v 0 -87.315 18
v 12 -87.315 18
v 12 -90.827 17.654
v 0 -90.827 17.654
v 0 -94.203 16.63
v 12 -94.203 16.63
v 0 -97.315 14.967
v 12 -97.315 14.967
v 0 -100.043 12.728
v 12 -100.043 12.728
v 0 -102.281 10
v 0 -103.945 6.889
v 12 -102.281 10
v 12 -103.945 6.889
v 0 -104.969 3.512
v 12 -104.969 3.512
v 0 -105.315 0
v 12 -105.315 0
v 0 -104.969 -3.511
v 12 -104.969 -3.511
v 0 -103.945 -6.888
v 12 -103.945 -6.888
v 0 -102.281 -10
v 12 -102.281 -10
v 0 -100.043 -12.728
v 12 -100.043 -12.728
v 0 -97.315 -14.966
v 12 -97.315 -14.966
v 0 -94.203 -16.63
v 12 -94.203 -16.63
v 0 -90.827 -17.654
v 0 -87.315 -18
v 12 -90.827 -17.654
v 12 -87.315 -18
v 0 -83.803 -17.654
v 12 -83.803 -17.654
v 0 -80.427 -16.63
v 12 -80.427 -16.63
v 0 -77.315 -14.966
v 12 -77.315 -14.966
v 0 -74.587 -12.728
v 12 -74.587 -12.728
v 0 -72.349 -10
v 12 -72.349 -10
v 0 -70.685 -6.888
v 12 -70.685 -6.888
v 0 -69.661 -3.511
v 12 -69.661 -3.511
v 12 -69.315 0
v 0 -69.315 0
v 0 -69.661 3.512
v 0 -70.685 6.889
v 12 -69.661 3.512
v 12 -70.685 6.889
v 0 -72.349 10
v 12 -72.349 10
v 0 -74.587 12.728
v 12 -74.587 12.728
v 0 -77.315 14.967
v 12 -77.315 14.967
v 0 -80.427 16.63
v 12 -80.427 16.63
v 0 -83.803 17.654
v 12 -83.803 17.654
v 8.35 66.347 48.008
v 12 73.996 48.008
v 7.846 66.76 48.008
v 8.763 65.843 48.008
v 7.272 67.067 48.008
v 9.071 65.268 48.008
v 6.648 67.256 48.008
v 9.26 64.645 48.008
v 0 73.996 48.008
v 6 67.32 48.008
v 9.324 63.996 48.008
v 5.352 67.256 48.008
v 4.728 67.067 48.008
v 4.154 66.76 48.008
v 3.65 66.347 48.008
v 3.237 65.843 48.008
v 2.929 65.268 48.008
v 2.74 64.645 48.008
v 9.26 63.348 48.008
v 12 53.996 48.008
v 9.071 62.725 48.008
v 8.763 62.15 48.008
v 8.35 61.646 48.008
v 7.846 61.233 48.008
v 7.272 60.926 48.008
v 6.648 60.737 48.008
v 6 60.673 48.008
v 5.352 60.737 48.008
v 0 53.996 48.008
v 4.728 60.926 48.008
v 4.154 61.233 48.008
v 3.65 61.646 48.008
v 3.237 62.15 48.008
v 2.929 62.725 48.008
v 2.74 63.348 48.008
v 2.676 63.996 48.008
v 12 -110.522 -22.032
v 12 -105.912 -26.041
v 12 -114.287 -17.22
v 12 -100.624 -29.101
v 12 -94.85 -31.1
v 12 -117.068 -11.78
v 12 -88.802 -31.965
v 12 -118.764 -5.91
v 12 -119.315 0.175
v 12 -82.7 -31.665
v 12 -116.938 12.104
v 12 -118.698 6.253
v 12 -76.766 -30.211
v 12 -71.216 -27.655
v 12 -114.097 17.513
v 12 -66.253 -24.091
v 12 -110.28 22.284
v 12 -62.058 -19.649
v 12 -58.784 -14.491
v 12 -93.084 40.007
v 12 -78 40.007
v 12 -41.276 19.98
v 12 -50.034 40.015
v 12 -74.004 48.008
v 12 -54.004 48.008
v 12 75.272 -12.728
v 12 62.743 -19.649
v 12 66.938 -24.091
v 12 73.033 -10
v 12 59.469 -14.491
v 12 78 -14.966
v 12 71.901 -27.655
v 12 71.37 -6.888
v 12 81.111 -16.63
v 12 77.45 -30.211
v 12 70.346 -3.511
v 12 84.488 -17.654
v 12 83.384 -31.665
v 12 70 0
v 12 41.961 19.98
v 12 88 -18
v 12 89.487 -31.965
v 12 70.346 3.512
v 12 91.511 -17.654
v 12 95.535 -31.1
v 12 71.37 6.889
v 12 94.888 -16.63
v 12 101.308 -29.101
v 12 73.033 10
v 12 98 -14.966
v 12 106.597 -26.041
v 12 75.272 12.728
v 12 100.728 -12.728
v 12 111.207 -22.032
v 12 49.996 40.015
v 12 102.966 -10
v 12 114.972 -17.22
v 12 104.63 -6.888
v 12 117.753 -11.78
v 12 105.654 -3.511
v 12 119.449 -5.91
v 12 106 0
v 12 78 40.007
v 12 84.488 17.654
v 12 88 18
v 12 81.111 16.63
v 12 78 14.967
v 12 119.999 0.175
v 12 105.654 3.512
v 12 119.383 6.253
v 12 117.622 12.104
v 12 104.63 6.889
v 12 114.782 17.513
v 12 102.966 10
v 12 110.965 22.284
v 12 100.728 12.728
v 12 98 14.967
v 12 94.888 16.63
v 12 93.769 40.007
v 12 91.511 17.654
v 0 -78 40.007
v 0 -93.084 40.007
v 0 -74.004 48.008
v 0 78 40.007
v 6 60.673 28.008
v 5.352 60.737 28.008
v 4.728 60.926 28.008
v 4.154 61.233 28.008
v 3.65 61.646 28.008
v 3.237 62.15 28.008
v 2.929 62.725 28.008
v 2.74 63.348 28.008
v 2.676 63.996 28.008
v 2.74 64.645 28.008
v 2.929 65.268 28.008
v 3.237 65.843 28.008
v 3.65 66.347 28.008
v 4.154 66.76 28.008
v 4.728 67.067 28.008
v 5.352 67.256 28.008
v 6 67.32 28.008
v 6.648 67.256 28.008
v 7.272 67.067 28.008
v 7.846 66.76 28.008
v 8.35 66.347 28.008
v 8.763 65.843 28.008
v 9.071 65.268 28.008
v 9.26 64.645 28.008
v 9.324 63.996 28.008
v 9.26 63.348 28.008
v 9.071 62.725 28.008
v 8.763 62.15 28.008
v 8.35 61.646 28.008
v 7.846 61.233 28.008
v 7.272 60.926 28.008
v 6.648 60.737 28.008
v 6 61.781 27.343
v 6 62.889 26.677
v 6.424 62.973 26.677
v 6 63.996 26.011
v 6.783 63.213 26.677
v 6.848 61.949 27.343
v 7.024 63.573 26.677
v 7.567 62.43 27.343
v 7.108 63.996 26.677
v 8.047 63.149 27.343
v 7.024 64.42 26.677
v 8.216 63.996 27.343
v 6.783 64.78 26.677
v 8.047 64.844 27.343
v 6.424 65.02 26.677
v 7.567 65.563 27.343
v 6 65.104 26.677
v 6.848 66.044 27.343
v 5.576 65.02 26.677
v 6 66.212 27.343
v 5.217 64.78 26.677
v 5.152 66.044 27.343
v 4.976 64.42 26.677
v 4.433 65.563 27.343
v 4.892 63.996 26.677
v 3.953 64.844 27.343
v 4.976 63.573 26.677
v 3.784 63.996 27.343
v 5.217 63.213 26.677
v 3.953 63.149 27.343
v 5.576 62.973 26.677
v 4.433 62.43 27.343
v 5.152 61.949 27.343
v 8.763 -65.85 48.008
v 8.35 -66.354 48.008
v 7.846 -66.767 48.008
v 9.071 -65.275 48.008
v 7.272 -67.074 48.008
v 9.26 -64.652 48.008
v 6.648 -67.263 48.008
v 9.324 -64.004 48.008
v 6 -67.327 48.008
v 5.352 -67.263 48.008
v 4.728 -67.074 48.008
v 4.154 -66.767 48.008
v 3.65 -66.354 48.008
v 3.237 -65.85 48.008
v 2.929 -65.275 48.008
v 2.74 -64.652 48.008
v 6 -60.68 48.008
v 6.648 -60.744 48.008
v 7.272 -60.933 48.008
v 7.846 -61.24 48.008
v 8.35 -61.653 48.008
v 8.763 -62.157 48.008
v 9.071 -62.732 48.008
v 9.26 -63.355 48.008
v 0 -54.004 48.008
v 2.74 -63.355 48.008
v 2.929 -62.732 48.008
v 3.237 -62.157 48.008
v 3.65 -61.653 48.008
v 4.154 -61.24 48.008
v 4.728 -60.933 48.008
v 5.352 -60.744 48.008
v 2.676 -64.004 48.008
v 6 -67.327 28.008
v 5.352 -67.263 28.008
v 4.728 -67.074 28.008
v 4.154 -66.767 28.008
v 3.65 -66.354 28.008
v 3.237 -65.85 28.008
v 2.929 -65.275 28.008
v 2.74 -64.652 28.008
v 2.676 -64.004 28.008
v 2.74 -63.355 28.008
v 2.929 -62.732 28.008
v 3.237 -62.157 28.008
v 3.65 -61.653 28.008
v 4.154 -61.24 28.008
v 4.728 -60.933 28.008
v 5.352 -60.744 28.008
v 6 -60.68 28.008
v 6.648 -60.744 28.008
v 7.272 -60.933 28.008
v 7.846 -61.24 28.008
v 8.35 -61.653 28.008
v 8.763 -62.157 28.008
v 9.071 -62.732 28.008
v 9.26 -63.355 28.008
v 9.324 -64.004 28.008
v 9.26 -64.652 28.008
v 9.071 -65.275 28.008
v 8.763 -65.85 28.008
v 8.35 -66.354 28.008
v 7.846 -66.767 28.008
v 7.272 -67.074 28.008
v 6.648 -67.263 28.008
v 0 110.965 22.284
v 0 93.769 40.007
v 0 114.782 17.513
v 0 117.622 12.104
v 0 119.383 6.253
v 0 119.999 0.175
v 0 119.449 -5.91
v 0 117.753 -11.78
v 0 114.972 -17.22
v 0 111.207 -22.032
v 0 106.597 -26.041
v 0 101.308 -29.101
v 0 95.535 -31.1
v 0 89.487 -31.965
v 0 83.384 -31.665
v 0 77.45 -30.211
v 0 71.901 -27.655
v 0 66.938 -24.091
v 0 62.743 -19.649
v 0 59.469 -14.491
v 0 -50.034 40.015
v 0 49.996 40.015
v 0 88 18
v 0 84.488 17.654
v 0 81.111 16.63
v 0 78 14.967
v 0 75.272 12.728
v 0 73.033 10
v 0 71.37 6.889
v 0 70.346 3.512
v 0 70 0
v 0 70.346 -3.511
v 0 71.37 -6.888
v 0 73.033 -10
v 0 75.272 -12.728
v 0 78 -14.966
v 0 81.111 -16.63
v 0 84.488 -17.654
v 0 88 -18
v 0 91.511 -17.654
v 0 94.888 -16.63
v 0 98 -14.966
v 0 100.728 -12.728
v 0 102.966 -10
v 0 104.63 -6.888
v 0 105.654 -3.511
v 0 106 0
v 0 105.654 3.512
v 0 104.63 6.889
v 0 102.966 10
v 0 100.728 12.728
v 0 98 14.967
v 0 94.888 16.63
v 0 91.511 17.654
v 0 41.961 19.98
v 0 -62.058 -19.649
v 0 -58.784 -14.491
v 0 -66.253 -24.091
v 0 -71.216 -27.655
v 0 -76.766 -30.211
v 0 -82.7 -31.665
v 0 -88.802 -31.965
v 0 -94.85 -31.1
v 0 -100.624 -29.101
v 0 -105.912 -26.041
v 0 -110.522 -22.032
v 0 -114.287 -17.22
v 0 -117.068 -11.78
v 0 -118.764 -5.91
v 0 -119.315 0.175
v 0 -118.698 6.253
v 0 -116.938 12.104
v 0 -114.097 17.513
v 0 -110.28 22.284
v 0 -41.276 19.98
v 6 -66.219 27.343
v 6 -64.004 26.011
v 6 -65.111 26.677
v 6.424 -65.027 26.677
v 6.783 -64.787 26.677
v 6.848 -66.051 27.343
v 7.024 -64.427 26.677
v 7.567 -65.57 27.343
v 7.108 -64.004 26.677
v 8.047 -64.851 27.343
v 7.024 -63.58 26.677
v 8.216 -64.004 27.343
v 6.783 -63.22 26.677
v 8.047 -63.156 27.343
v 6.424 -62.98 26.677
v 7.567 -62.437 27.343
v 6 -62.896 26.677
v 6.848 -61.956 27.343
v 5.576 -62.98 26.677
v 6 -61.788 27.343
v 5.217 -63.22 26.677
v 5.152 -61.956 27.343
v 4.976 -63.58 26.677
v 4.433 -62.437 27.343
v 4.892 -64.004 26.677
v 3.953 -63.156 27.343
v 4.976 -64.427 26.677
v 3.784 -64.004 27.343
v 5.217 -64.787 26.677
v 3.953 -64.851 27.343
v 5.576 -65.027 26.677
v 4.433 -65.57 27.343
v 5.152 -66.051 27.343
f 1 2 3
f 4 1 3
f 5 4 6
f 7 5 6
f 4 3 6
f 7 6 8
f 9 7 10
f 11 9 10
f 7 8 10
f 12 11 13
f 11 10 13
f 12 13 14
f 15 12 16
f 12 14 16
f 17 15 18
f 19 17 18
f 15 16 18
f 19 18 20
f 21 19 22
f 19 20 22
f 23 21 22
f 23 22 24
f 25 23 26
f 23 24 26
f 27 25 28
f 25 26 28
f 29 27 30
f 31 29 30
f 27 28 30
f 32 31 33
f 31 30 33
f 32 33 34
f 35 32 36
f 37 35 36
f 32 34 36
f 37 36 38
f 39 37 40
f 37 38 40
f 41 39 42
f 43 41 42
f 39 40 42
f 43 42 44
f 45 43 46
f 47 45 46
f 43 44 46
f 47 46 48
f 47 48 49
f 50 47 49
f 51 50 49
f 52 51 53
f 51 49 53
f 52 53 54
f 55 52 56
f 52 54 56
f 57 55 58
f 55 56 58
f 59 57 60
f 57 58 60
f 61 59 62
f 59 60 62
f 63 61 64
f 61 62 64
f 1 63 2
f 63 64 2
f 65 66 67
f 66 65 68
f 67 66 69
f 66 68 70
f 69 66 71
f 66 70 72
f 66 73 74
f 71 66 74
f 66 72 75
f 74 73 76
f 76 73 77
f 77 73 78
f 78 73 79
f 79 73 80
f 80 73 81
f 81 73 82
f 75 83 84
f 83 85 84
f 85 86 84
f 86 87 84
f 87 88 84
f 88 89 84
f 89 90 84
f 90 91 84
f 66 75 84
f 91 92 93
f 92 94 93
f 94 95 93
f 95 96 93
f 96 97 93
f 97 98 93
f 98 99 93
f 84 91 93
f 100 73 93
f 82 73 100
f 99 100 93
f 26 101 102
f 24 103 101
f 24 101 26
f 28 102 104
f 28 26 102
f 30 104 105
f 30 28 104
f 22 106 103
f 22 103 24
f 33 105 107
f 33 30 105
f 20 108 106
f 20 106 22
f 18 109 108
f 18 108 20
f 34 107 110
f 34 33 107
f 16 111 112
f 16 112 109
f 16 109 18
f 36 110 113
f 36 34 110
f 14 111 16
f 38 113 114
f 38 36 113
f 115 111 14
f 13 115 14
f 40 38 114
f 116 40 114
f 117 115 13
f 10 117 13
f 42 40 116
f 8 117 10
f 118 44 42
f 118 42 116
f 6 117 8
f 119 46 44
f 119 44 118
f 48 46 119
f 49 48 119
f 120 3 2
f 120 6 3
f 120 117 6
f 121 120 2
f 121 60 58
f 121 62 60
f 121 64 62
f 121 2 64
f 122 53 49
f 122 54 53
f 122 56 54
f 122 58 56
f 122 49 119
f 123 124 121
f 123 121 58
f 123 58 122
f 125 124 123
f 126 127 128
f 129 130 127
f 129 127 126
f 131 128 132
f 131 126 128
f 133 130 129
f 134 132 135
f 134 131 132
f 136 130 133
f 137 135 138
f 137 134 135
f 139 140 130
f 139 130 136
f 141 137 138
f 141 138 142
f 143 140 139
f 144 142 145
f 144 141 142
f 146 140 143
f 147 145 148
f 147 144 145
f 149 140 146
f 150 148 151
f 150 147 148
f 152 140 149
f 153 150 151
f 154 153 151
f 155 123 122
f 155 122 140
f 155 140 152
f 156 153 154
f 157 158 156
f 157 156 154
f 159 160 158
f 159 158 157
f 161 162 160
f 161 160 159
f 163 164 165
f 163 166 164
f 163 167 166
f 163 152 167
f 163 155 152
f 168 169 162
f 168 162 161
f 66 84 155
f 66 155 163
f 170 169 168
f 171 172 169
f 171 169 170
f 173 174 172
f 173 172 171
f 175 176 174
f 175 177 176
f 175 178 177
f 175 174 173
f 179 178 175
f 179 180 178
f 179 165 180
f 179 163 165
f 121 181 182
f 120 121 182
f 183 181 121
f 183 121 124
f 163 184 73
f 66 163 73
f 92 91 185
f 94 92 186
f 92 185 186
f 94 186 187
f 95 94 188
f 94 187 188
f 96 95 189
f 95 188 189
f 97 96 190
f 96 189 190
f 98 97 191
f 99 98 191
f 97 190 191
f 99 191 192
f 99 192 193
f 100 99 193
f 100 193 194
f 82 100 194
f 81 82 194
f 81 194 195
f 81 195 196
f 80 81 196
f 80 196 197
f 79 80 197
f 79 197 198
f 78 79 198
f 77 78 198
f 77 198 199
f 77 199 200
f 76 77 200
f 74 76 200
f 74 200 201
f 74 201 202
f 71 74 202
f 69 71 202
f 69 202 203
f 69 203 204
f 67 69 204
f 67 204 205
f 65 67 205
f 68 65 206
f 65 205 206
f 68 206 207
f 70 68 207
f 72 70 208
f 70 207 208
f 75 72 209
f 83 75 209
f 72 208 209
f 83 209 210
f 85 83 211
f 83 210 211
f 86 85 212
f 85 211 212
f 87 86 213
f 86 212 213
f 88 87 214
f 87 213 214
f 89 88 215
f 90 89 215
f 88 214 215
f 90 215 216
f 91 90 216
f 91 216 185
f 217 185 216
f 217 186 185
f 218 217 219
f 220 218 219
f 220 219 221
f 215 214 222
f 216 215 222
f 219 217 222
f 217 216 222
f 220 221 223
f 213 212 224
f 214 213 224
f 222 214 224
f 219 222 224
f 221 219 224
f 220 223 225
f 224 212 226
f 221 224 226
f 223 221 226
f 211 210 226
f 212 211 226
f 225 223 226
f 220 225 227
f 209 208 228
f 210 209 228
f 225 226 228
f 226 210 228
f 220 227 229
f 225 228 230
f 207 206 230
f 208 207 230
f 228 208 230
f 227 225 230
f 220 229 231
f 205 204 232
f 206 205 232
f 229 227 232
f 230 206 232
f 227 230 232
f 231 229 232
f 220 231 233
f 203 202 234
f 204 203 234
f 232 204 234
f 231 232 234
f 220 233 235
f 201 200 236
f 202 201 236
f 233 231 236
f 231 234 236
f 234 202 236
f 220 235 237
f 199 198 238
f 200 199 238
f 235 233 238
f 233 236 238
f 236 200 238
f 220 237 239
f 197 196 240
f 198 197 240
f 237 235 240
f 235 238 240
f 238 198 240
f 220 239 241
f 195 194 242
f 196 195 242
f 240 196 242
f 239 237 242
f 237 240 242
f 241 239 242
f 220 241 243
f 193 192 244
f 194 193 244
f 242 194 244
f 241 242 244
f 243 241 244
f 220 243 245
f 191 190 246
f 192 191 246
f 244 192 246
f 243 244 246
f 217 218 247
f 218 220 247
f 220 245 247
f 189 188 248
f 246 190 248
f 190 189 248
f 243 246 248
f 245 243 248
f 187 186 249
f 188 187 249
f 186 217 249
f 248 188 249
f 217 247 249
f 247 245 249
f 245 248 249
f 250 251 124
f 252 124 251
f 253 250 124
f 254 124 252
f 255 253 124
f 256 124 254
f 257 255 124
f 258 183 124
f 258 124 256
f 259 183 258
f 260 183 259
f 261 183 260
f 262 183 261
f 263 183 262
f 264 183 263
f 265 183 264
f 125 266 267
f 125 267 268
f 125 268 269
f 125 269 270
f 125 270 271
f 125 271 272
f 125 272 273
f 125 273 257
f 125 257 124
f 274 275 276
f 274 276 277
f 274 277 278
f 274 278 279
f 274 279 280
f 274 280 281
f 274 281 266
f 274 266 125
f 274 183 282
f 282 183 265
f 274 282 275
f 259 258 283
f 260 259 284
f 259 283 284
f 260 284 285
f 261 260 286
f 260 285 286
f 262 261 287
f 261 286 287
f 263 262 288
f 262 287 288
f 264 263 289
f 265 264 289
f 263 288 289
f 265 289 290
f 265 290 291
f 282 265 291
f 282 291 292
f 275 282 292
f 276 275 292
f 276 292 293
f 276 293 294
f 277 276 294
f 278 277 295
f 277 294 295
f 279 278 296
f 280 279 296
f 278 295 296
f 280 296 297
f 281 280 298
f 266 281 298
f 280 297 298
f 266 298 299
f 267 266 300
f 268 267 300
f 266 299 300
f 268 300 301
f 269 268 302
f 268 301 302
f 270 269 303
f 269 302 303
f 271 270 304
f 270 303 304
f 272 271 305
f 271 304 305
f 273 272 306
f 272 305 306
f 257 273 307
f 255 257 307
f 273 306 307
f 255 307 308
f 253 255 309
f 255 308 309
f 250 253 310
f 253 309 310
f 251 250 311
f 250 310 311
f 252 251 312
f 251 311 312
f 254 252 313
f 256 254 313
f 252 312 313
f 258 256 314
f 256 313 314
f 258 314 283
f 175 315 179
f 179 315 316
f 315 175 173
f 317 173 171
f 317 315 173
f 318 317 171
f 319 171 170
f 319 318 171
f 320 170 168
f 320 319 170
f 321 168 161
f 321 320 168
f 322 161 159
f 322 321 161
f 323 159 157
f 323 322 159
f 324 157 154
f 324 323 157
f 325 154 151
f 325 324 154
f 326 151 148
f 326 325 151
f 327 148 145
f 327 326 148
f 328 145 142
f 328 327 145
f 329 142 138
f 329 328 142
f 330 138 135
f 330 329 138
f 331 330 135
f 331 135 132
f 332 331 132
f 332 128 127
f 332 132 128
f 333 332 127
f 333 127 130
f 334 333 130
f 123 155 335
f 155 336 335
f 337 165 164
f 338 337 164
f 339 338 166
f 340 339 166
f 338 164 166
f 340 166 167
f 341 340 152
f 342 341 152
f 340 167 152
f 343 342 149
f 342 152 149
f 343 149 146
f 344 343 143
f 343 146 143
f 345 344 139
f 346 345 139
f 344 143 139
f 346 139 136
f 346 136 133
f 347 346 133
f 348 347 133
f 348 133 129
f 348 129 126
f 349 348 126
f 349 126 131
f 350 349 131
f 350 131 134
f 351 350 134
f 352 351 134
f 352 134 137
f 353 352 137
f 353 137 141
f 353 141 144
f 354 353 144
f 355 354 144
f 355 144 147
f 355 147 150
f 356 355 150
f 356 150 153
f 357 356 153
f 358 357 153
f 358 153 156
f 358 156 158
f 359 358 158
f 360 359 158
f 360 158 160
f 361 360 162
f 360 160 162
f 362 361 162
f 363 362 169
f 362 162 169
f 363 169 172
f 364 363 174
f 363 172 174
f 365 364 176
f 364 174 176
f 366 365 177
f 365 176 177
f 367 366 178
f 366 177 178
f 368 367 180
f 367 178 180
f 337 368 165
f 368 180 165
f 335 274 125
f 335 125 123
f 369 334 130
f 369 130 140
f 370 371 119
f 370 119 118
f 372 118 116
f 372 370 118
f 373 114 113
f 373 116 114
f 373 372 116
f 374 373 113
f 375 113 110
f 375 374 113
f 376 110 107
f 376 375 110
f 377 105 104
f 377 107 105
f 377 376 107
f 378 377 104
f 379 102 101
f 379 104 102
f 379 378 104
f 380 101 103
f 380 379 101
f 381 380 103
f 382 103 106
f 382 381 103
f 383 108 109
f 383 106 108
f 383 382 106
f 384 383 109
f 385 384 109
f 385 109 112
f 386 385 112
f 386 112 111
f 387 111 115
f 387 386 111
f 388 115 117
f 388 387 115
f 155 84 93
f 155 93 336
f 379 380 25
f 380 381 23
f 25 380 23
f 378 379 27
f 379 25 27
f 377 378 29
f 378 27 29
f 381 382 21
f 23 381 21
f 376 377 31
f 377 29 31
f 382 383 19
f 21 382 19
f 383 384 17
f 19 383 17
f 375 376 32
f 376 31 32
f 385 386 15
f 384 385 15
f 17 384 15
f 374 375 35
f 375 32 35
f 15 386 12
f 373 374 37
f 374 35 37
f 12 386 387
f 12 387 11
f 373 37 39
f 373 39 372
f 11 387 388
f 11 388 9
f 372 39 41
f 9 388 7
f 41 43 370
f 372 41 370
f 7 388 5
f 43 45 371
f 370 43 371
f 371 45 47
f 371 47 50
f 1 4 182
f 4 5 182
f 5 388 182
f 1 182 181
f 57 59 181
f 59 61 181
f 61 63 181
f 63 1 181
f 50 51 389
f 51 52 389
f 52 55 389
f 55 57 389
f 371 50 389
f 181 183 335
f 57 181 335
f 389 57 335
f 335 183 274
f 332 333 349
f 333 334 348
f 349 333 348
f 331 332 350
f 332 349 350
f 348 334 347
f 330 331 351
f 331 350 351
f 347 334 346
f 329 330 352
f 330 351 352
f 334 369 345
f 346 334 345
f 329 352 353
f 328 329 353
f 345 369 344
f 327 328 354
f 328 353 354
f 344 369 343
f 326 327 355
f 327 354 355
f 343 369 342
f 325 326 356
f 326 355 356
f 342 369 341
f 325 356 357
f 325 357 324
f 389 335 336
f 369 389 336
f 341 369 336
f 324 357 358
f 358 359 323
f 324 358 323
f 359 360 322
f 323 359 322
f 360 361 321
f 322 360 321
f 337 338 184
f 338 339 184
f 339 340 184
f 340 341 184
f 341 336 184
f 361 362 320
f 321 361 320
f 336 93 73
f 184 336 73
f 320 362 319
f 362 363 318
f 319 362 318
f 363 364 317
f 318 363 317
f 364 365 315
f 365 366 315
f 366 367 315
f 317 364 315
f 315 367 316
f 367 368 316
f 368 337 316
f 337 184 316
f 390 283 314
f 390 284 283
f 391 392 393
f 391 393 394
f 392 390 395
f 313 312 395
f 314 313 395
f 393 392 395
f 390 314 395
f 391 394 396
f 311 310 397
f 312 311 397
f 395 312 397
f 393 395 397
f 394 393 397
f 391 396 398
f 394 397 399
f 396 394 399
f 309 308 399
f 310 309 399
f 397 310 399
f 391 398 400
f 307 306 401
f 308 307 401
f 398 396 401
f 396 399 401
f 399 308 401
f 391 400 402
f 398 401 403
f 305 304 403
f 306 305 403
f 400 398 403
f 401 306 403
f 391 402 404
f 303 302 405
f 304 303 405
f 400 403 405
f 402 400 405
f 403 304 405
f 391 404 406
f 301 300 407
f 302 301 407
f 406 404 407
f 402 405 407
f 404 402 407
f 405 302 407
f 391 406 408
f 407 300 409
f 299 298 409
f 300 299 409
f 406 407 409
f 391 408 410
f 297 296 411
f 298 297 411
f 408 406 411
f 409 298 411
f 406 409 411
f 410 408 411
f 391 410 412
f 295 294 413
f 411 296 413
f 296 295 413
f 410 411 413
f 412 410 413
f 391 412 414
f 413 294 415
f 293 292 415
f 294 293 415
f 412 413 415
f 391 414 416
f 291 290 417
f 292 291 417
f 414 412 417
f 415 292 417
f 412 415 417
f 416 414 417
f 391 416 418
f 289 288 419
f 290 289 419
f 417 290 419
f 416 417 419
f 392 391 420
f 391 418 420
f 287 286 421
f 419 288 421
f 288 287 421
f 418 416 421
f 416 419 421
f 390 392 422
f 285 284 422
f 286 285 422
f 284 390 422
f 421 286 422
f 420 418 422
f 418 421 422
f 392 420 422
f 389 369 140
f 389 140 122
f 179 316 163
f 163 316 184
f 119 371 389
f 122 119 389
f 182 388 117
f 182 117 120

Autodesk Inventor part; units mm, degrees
ref_plane "YZ Plane" through (0, 0, 0) normal (1, 0, 0) x (0, 1, 0)
ref_plane "XZ Plane" through (0, 0, 0) normal (0, 1, 0) x (-1, 0, 0)
sketch "Sketch1" plane through (0, 0, 0) normal (1, 0, 0) x (0, 1, 0)
  arc A0 (59.469, -14.4909) -> (110.9653, 22.2844) centre (87.9998, 0.0002) ccw
  line L0 (110.9653, 22.2844) -> (93.7688, 40.0067)
  line L1 (0.3424, 140.3326) -> (0.3424, -179.6674) construction
  arc A1 (-110.2805, 22.2844) -> (-58.7842, -14.4909) centre (-87.315, 0.0002) ccw
  line L2 (-110.2805, 22.2844) -> (-93.0839, 40.0067)
  line L3 (-88, 40.0067) -> (-88.0045, 40)
  line L4 (57.9955, 40) -> (58, 40.0067)
  line L5 (49.9965, 40.0151) -> (-50.0337, 40.0151)
  line L6 (59.469, -14.4909) -> (41.9609, 19.9801)
  line L7 (-58.7842, -14.4909) -> (-41.2761, 19.9801)
  line L8 (41.9609, 19.9801) -> (-41.2761, 19.9801)
  line L9 (78, 40.0067) -> (73.9965, 48.0084)
  line L10 (73.9965, 48.0084) -> (53.9965, 48.0084)
  line L11 (53.9965, 48.0084) -> (49.9965, 40.0151)
  line L12 (-78, 40.0067) -> (-74.0035, 48.0084)
  line L13 (-74.0035, 48.0084) -> (-54.0035, 48.0084)
  line L14 (-54.0035, 48.0084) -> (-50.0337, 40.0151)
  line L15 (93.7688, 40.0067) -> (78, 40.0067)
  line L16 (-78, 40.0067) -> (-93.0839, 40.0067)
  point P0 (0, 0)
  point P1 (83, 40)
  point P2 (63.9965, 48.0084)
  point P3 (-64.0035, 48.0084)
extrude "Extrusion2" add sketch "Sketch1" along normal blind 12
hole "Hole4" at (0, -87.315, 0.0002) at (0, 87.9998, 0.0002) direction (1, 0, 0) diameter 36 end through all
ref_plane "Work Plane2" through (0, -64.0035, 48.0084) normal (0, 0, 1) x (1, 0, 0)
sketch "Sketch3" plane through (0, -74.0035, 48.0084) normal (0, 0, 1) x (1, 0, 0)
  point P0 (0, 74.0035)
  point P1 (6, 10)
  point P2 (6, 138)
hole "Hole5" at (6, -64.0035, 48.0084) at (6, 63.9965, 48.0084) direction (0, 0, -1) diameter 6.647 depth 20 tip angle 118 thread size "M8x1.25" class "6H" standard "ISO Metric profile"
properties part number "PlateConnector"
